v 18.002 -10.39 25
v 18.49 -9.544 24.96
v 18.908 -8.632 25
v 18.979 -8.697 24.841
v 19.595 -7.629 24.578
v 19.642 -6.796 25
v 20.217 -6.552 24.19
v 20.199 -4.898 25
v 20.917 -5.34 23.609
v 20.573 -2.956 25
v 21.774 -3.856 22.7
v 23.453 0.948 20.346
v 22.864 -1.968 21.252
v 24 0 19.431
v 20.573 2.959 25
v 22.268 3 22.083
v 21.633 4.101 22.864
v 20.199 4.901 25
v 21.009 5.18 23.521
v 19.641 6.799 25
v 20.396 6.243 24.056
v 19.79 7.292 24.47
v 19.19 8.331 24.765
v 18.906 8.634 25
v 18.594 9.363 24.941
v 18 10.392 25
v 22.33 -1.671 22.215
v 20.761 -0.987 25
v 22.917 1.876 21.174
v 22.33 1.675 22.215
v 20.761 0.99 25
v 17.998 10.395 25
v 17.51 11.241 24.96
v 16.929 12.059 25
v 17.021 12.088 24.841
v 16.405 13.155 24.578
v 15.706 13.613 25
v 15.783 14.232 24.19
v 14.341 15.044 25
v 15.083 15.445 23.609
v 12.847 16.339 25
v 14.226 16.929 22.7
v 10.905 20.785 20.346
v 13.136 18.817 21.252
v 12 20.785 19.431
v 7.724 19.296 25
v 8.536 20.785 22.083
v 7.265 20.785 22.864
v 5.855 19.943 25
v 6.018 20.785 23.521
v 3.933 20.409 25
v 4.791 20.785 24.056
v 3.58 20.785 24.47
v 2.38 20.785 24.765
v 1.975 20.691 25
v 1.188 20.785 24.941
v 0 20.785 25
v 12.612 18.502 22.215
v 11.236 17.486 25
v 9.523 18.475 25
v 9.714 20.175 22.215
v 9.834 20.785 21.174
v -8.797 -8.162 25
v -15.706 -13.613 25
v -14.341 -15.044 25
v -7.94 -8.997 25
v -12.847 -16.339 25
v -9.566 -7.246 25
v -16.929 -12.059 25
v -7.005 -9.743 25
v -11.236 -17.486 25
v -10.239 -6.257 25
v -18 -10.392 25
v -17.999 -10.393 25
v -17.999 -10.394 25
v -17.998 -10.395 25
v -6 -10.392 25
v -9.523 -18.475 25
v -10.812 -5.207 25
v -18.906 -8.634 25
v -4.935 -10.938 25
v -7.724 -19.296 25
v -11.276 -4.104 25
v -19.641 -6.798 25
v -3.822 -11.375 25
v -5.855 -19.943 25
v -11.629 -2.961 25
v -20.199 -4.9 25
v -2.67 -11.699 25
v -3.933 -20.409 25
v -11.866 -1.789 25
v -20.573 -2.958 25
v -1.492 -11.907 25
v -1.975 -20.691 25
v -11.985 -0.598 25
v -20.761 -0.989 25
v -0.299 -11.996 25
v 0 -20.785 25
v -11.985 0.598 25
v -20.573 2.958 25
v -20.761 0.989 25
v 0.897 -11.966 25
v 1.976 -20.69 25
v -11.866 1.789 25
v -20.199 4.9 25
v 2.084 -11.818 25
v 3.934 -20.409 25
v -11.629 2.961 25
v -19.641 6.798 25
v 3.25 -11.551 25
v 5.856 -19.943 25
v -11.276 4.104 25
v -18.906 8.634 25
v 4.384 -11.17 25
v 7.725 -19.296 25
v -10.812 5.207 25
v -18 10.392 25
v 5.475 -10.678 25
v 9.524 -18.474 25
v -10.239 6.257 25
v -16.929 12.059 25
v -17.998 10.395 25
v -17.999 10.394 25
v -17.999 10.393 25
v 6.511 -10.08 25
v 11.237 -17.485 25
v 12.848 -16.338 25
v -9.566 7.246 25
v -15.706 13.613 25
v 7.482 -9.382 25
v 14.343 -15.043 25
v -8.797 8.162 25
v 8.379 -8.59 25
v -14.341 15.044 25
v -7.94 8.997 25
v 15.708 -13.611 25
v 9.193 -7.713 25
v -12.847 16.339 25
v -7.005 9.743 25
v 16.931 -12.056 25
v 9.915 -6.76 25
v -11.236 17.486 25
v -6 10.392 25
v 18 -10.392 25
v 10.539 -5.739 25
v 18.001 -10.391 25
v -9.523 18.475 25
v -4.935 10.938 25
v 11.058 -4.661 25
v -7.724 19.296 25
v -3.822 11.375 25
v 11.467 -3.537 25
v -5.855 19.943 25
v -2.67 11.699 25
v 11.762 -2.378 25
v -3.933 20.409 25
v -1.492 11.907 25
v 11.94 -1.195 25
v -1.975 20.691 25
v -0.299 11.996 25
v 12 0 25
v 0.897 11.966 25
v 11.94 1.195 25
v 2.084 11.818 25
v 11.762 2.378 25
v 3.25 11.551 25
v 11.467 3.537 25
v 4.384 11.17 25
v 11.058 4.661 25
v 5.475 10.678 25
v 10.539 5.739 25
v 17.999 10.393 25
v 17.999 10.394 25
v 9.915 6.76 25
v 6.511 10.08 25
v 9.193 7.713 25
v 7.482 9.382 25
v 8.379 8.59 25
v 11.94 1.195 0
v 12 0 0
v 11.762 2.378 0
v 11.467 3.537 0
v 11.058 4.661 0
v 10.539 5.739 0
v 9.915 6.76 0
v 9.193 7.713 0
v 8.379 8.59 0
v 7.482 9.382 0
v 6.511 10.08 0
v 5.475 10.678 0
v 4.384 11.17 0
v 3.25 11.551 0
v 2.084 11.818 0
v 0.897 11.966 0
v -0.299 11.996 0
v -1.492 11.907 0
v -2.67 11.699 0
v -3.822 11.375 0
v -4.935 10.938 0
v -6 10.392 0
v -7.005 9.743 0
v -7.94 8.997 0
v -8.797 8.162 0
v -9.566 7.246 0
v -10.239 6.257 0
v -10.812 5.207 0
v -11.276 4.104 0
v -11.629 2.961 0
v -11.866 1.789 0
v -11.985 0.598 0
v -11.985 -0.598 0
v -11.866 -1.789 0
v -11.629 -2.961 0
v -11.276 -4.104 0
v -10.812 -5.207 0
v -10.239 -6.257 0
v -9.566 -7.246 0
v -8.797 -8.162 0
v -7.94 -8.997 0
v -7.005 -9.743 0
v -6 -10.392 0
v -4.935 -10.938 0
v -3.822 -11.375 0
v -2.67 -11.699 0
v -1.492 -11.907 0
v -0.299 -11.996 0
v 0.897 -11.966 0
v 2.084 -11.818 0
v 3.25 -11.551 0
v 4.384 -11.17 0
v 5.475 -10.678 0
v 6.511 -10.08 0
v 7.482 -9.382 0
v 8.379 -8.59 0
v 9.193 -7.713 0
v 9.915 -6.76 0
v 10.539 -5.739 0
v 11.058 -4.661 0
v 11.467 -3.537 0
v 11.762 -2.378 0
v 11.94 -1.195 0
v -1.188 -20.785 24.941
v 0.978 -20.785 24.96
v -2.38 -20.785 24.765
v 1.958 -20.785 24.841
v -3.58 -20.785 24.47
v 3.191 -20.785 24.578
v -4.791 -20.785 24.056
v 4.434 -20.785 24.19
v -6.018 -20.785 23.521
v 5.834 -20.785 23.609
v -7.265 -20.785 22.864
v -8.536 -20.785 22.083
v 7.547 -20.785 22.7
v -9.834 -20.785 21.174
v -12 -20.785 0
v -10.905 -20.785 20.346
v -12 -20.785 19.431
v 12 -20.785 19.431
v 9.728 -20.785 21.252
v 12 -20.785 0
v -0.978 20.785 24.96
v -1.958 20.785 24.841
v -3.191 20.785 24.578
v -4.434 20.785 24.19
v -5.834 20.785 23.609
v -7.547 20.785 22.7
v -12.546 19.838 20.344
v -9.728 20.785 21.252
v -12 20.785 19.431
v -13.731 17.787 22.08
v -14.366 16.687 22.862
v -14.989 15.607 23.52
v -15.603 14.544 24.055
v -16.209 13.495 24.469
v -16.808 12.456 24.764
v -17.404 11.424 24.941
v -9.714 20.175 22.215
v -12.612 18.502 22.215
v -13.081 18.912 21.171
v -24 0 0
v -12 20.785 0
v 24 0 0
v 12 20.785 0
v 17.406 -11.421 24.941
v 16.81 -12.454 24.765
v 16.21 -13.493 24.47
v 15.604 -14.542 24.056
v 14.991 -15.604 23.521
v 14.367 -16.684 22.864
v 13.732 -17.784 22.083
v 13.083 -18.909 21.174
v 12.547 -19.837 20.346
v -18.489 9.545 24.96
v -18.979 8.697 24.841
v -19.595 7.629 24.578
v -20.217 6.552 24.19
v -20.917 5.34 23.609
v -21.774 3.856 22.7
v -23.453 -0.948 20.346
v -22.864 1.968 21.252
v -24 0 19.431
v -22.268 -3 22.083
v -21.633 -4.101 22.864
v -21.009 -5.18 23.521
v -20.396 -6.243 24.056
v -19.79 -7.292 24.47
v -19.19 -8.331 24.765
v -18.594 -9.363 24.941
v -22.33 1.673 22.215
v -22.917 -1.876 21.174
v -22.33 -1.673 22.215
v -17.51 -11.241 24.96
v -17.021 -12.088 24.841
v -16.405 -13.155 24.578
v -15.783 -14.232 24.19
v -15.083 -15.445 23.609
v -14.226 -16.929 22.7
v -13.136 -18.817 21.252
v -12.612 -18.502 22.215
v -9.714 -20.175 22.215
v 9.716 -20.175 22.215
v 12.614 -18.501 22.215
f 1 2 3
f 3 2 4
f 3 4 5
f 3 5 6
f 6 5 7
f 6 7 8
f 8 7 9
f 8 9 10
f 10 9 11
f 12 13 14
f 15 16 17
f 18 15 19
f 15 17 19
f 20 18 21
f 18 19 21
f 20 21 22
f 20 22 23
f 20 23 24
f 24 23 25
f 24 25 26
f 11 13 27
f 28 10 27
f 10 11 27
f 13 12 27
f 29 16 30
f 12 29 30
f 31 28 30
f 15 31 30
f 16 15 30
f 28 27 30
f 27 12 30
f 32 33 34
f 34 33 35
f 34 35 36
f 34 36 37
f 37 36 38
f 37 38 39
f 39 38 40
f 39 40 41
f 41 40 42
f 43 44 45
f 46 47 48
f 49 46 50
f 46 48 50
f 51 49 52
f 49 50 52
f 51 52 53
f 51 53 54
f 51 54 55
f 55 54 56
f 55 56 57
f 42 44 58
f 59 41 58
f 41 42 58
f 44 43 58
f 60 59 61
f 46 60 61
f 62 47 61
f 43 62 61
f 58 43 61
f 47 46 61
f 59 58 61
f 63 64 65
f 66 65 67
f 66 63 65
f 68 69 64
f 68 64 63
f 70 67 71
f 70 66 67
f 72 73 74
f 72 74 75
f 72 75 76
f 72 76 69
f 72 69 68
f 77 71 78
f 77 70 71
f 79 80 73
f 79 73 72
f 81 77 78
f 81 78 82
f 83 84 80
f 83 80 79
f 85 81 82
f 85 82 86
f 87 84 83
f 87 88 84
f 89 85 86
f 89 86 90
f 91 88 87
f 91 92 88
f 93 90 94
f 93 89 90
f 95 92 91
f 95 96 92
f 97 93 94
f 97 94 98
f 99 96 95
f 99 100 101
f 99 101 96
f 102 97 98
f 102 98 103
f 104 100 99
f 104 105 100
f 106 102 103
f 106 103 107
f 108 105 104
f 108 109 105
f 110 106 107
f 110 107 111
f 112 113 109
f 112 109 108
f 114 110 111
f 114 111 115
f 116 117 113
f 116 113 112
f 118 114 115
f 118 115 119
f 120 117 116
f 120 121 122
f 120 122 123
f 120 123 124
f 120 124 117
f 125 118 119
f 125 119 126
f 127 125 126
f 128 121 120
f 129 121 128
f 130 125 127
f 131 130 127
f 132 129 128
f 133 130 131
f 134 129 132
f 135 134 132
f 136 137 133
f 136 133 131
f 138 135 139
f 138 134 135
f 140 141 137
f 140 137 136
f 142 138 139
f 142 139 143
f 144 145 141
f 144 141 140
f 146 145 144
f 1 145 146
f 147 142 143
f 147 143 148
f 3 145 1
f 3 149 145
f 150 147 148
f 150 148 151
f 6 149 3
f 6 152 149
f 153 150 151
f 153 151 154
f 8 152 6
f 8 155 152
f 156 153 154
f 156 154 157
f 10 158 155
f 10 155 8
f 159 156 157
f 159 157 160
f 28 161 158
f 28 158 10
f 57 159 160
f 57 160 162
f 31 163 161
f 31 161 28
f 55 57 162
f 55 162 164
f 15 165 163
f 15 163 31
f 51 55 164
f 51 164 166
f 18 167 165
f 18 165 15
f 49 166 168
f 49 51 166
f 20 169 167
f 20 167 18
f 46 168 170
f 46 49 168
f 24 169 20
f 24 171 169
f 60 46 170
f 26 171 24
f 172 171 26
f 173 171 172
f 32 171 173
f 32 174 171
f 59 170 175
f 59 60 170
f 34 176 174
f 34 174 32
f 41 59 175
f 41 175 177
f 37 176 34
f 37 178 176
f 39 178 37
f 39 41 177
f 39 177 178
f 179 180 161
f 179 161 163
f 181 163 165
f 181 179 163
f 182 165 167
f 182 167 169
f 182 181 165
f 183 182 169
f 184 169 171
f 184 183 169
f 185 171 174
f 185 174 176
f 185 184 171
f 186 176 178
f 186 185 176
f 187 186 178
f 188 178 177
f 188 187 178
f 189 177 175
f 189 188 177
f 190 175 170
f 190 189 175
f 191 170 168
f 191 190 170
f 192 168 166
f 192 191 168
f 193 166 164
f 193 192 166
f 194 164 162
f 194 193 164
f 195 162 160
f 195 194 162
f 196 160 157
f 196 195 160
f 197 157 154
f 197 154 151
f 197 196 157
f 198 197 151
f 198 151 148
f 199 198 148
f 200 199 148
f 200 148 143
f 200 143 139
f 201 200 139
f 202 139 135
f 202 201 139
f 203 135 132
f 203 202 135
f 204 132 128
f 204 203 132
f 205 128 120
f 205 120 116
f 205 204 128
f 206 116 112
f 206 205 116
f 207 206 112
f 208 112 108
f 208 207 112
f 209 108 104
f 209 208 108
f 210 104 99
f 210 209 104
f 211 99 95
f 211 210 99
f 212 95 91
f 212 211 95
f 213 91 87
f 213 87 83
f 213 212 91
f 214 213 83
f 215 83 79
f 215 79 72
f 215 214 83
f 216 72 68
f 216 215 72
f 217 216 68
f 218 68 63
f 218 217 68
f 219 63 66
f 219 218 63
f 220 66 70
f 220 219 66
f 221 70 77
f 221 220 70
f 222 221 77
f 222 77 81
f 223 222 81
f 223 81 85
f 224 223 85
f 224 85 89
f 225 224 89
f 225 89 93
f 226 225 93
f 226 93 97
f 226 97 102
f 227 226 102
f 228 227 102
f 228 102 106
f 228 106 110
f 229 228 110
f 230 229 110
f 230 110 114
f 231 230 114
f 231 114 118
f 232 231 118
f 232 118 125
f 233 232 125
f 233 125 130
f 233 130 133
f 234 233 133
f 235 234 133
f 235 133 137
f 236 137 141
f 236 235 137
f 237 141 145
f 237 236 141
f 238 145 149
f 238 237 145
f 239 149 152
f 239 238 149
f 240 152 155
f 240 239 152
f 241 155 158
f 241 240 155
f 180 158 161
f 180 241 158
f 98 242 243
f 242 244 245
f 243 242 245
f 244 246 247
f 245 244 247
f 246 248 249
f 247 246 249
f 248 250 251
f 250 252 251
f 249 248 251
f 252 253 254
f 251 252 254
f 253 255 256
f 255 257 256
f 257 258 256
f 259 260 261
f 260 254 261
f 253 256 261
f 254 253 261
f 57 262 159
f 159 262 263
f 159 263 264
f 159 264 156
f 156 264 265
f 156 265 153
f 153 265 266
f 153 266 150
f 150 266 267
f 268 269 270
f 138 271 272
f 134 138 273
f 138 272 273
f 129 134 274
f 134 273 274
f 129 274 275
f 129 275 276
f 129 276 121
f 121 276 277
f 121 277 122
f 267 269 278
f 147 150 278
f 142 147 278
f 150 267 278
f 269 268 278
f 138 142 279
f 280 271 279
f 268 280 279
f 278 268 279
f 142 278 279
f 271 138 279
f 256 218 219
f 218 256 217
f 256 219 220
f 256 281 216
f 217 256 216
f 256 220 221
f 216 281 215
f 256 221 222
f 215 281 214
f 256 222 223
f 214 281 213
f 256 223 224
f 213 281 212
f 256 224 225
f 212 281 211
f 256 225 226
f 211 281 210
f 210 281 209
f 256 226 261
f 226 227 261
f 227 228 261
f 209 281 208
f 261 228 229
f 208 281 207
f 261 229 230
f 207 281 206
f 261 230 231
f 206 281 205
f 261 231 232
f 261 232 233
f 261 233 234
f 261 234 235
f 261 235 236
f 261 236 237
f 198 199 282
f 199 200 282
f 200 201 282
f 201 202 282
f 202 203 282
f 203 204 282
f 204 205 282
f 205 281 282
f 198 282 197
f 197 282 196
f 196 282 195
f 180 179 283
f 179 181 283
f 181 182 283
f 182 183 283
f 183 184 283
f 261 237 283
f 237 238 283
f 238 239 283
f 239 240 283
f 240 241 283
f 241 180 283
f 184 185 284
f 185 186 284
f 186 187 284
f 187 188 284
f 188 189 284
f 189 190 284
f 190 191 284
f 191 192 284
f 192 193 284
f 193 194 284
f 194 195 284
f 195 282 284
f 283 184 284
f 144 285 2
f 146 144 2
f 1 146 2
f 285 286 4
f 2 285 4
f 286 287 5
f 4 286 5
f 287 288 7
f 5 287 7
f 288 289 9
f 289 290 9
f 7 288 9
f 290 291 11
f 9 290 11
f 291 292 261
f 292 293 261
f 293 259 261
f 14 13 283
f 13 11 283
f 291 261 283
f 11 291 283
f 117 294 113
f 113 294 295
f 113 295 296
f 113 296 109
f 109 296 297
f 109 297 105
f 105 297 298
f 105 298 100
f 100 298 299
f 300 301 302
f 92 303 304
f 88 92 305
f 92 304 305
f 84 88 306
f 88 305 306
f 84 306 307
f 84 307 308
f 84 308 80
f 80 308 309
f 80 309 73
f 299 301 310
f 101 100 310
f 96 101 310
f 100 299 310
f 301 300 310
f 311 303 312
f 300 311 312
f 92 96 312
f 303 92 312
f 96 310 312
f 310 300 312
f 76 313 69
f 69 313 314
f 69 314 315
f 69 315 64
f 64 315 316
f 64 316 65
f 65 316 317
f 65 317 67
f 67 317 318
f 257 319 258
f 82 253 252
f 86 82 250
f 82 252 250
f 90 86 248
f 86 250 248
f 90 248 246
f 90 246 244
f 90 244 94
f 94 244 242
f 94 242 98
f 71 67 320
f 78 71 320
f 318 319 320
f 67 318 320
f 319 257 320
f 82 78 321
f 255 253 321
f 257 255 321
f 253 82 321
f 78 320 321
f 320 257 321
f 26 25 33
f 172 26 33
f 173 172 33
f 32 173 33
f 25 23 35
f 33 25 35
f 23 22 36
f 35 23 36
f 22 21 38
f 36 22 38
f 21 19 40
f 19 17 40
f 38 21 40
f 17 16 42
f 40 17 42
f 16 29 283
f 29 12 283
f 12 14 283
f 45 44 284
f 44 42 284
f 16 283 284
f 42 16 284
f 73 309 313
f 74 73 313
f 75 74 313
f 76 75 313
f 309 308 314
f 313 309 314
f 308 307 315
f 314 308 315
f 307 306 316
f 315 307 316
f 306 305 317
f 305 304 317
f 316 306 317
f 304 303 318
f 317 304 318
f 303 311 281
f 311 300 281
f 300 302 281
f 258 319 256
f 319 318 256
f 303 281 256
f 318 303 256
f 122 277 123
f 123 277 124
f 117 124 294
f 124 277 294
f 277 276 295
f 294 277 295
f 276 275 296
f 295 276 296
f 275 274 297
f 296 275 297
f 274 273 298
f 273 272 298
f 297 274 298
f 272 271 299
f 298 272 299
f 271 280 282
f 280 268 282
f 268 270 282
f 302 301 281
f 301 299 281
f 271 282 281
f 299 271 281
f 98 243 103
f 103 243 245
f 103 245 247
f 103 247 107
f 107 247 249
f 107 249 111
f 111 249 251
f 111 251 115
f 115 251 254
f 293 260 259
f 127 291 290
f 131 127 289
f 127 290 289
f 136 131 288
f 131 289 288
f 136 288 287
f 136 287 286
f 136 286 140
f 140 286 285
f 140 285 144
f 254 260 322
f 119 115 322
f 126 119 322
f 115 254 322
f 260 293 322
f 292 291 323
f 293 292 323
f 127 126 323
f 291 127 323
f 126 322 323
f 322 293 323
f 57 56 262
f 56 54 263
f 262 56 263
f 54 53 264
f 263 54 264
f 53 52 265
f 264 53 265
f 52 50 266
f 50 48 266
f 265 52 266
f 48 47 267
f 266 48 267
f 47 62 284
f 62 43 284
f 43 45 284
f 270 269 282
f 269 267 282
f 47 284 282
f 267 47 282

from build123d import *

# Parameters (mm, degrees)
F0_R     = 12
F1_DEPTH = 25


with BuildPart() as f1:
    # F0 (on Top) → F1 (new body)
    with BuildSketch(Plane.XY):
        Polygon((24, 0), (12, 20.78461), (-12, 20.78461), (-24, 0), (-12, -20.78461), (12, -20.78461), align=None)
        Circle(F0_R, mode=Mode.SUBTRACT)
    extrude(amount=F1_DEPTH)

    # F3 (on Front) → F4 (revolve, cut)
    with BuildSketch(Plane.XZ):
        Polygon((24, 25), (20.78461, 25), (24, 19.430781), align=None)
    revolve(axis=Axis((0, 0, 14.01754), (0, 0, 1)), mode=Mode.SUBTRACT)


solid = f1.part
